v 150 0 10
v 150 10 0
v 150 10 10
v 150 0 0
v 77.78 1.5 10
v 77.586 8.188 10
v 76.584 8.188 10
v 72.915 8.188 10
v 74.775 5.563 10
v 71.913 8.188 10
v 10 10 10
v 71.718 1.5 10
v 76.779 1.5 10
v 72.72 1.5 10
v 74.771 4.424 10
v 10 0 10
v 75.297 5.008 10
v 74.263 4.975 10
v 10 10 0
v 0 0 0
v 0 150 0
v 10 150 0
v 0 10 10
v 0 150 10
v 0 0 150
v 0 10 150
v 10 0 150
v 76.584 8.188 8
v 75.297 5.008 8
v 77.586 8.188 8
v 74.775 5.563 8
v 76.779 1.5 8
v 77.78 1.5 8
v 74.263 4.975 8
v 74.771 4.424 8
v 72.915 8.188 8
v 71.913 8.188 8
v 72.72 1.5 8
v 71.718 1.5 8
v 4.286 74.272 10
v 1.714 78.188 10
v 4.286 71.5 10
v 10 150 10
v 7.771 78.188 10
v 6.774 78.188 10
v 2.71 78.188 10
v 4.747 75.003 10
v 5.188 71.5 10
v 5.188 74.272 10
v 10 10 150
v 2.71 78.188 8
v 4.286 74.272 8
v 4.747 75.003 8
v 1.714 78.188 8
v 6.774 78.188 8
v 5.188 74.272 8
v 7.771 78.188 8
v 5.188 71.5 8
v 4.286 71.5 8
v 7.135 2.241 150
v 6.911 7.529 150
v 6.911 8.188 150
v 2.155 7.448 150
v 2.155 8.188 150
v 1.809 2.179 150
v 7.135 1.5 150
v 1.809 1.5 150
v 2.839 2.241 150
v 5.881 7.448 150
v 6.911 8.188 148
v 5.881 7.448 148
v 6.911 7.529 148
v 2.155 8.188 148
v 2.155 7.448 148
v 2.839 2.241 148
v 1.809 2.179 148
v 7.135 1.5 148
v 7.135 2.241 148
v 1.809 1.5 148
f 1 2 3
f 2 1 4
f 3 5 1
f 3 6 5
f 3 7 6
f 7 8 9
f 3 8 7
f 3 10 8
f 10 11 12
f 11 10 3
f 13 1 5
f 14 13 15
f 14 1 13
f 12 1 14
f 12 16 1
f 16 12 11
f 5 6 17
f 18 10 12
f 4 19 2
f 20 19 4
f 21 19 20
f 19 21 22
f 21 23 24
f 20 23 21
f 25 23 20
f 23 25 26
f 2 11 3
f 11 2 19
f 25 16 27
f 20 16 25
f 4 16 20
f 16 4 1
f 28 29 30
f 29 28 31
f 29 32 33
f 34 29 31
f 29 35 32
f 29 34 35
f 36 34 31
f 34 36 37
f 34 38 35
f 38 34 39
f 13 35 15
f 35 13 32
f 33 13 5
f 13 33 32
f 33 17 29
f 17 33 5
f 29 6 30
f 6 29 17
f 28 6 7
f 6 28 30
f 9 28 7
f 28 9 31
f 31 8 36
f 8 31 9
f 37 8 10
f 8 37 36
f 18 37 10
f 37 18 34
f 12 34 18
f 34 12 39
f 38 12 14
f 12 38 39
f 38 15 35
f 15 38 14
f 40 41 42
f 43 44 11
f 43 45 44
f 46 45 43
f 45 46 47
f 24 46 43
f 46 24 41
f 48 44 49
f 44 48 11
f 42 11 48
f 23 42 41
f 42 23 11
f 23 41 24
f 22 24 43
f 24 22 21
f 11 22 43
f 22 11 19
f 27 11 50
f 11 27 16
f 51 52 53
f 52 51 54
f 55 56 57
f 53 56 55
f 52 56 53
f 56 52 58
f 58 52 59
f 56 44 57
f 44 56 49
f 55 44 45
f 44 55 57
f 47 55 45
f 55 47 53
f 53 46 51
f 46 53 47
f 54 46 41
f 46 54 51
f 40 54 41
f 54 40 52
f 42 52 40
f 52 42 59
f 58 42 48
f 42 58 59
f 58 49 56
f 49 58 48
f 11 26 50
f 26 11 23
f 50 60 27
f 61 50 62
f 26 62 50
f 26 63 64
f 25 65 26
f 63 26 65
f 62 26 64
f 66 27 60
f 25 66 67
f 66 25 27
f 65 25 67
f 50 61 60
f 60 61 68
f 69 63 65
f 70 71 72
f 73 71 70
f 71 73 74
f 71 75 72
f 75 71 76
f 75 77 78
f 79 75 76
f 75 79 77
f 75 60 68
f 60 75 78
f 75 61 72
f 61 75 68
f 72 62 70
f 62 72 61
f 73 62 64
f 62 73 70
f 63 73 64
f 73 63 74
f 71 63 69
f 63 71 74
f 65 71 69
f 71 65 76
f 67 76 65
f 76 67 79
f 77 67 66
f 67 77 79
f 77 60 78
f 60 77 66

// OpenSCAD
calibration_axes();

module calibration_axes(side=150, thickness=10, text_height=2, text_size=7) {
    // X-axis
    difference() {
        cube([side, thickness, thickness]);
        translate([
                side/2-text_size/2,
                (thickness-text_size)/2,
                thickness-text_height])
            linear_extrude(text_height)
            text("X", size=text_size);
    }
    // Y-axis
    difference() {
        translate([thickness, 0, 0])
            rotate([0, 0, 90])
            cube([side, thickness, thickness]);
        translate([
                (thickness-text_size)/2,
                side/2-text_size/2,
                thickness-text_height])
            linear_extrude(text_height)
            text("Y", size=text_size);
    }
    // Z-axis
    difference() {
        translate([thickness, 0, 0])
            rotate([0, -90, 0])
            cube([side, thickness, thickness]);
        translate([
                (thickness-text_size)/2,
                (thickness-text_size)/2,
                side-text_height])
            linear_extrude(text_height)
            text("Z", size=text_size);
    }
}
